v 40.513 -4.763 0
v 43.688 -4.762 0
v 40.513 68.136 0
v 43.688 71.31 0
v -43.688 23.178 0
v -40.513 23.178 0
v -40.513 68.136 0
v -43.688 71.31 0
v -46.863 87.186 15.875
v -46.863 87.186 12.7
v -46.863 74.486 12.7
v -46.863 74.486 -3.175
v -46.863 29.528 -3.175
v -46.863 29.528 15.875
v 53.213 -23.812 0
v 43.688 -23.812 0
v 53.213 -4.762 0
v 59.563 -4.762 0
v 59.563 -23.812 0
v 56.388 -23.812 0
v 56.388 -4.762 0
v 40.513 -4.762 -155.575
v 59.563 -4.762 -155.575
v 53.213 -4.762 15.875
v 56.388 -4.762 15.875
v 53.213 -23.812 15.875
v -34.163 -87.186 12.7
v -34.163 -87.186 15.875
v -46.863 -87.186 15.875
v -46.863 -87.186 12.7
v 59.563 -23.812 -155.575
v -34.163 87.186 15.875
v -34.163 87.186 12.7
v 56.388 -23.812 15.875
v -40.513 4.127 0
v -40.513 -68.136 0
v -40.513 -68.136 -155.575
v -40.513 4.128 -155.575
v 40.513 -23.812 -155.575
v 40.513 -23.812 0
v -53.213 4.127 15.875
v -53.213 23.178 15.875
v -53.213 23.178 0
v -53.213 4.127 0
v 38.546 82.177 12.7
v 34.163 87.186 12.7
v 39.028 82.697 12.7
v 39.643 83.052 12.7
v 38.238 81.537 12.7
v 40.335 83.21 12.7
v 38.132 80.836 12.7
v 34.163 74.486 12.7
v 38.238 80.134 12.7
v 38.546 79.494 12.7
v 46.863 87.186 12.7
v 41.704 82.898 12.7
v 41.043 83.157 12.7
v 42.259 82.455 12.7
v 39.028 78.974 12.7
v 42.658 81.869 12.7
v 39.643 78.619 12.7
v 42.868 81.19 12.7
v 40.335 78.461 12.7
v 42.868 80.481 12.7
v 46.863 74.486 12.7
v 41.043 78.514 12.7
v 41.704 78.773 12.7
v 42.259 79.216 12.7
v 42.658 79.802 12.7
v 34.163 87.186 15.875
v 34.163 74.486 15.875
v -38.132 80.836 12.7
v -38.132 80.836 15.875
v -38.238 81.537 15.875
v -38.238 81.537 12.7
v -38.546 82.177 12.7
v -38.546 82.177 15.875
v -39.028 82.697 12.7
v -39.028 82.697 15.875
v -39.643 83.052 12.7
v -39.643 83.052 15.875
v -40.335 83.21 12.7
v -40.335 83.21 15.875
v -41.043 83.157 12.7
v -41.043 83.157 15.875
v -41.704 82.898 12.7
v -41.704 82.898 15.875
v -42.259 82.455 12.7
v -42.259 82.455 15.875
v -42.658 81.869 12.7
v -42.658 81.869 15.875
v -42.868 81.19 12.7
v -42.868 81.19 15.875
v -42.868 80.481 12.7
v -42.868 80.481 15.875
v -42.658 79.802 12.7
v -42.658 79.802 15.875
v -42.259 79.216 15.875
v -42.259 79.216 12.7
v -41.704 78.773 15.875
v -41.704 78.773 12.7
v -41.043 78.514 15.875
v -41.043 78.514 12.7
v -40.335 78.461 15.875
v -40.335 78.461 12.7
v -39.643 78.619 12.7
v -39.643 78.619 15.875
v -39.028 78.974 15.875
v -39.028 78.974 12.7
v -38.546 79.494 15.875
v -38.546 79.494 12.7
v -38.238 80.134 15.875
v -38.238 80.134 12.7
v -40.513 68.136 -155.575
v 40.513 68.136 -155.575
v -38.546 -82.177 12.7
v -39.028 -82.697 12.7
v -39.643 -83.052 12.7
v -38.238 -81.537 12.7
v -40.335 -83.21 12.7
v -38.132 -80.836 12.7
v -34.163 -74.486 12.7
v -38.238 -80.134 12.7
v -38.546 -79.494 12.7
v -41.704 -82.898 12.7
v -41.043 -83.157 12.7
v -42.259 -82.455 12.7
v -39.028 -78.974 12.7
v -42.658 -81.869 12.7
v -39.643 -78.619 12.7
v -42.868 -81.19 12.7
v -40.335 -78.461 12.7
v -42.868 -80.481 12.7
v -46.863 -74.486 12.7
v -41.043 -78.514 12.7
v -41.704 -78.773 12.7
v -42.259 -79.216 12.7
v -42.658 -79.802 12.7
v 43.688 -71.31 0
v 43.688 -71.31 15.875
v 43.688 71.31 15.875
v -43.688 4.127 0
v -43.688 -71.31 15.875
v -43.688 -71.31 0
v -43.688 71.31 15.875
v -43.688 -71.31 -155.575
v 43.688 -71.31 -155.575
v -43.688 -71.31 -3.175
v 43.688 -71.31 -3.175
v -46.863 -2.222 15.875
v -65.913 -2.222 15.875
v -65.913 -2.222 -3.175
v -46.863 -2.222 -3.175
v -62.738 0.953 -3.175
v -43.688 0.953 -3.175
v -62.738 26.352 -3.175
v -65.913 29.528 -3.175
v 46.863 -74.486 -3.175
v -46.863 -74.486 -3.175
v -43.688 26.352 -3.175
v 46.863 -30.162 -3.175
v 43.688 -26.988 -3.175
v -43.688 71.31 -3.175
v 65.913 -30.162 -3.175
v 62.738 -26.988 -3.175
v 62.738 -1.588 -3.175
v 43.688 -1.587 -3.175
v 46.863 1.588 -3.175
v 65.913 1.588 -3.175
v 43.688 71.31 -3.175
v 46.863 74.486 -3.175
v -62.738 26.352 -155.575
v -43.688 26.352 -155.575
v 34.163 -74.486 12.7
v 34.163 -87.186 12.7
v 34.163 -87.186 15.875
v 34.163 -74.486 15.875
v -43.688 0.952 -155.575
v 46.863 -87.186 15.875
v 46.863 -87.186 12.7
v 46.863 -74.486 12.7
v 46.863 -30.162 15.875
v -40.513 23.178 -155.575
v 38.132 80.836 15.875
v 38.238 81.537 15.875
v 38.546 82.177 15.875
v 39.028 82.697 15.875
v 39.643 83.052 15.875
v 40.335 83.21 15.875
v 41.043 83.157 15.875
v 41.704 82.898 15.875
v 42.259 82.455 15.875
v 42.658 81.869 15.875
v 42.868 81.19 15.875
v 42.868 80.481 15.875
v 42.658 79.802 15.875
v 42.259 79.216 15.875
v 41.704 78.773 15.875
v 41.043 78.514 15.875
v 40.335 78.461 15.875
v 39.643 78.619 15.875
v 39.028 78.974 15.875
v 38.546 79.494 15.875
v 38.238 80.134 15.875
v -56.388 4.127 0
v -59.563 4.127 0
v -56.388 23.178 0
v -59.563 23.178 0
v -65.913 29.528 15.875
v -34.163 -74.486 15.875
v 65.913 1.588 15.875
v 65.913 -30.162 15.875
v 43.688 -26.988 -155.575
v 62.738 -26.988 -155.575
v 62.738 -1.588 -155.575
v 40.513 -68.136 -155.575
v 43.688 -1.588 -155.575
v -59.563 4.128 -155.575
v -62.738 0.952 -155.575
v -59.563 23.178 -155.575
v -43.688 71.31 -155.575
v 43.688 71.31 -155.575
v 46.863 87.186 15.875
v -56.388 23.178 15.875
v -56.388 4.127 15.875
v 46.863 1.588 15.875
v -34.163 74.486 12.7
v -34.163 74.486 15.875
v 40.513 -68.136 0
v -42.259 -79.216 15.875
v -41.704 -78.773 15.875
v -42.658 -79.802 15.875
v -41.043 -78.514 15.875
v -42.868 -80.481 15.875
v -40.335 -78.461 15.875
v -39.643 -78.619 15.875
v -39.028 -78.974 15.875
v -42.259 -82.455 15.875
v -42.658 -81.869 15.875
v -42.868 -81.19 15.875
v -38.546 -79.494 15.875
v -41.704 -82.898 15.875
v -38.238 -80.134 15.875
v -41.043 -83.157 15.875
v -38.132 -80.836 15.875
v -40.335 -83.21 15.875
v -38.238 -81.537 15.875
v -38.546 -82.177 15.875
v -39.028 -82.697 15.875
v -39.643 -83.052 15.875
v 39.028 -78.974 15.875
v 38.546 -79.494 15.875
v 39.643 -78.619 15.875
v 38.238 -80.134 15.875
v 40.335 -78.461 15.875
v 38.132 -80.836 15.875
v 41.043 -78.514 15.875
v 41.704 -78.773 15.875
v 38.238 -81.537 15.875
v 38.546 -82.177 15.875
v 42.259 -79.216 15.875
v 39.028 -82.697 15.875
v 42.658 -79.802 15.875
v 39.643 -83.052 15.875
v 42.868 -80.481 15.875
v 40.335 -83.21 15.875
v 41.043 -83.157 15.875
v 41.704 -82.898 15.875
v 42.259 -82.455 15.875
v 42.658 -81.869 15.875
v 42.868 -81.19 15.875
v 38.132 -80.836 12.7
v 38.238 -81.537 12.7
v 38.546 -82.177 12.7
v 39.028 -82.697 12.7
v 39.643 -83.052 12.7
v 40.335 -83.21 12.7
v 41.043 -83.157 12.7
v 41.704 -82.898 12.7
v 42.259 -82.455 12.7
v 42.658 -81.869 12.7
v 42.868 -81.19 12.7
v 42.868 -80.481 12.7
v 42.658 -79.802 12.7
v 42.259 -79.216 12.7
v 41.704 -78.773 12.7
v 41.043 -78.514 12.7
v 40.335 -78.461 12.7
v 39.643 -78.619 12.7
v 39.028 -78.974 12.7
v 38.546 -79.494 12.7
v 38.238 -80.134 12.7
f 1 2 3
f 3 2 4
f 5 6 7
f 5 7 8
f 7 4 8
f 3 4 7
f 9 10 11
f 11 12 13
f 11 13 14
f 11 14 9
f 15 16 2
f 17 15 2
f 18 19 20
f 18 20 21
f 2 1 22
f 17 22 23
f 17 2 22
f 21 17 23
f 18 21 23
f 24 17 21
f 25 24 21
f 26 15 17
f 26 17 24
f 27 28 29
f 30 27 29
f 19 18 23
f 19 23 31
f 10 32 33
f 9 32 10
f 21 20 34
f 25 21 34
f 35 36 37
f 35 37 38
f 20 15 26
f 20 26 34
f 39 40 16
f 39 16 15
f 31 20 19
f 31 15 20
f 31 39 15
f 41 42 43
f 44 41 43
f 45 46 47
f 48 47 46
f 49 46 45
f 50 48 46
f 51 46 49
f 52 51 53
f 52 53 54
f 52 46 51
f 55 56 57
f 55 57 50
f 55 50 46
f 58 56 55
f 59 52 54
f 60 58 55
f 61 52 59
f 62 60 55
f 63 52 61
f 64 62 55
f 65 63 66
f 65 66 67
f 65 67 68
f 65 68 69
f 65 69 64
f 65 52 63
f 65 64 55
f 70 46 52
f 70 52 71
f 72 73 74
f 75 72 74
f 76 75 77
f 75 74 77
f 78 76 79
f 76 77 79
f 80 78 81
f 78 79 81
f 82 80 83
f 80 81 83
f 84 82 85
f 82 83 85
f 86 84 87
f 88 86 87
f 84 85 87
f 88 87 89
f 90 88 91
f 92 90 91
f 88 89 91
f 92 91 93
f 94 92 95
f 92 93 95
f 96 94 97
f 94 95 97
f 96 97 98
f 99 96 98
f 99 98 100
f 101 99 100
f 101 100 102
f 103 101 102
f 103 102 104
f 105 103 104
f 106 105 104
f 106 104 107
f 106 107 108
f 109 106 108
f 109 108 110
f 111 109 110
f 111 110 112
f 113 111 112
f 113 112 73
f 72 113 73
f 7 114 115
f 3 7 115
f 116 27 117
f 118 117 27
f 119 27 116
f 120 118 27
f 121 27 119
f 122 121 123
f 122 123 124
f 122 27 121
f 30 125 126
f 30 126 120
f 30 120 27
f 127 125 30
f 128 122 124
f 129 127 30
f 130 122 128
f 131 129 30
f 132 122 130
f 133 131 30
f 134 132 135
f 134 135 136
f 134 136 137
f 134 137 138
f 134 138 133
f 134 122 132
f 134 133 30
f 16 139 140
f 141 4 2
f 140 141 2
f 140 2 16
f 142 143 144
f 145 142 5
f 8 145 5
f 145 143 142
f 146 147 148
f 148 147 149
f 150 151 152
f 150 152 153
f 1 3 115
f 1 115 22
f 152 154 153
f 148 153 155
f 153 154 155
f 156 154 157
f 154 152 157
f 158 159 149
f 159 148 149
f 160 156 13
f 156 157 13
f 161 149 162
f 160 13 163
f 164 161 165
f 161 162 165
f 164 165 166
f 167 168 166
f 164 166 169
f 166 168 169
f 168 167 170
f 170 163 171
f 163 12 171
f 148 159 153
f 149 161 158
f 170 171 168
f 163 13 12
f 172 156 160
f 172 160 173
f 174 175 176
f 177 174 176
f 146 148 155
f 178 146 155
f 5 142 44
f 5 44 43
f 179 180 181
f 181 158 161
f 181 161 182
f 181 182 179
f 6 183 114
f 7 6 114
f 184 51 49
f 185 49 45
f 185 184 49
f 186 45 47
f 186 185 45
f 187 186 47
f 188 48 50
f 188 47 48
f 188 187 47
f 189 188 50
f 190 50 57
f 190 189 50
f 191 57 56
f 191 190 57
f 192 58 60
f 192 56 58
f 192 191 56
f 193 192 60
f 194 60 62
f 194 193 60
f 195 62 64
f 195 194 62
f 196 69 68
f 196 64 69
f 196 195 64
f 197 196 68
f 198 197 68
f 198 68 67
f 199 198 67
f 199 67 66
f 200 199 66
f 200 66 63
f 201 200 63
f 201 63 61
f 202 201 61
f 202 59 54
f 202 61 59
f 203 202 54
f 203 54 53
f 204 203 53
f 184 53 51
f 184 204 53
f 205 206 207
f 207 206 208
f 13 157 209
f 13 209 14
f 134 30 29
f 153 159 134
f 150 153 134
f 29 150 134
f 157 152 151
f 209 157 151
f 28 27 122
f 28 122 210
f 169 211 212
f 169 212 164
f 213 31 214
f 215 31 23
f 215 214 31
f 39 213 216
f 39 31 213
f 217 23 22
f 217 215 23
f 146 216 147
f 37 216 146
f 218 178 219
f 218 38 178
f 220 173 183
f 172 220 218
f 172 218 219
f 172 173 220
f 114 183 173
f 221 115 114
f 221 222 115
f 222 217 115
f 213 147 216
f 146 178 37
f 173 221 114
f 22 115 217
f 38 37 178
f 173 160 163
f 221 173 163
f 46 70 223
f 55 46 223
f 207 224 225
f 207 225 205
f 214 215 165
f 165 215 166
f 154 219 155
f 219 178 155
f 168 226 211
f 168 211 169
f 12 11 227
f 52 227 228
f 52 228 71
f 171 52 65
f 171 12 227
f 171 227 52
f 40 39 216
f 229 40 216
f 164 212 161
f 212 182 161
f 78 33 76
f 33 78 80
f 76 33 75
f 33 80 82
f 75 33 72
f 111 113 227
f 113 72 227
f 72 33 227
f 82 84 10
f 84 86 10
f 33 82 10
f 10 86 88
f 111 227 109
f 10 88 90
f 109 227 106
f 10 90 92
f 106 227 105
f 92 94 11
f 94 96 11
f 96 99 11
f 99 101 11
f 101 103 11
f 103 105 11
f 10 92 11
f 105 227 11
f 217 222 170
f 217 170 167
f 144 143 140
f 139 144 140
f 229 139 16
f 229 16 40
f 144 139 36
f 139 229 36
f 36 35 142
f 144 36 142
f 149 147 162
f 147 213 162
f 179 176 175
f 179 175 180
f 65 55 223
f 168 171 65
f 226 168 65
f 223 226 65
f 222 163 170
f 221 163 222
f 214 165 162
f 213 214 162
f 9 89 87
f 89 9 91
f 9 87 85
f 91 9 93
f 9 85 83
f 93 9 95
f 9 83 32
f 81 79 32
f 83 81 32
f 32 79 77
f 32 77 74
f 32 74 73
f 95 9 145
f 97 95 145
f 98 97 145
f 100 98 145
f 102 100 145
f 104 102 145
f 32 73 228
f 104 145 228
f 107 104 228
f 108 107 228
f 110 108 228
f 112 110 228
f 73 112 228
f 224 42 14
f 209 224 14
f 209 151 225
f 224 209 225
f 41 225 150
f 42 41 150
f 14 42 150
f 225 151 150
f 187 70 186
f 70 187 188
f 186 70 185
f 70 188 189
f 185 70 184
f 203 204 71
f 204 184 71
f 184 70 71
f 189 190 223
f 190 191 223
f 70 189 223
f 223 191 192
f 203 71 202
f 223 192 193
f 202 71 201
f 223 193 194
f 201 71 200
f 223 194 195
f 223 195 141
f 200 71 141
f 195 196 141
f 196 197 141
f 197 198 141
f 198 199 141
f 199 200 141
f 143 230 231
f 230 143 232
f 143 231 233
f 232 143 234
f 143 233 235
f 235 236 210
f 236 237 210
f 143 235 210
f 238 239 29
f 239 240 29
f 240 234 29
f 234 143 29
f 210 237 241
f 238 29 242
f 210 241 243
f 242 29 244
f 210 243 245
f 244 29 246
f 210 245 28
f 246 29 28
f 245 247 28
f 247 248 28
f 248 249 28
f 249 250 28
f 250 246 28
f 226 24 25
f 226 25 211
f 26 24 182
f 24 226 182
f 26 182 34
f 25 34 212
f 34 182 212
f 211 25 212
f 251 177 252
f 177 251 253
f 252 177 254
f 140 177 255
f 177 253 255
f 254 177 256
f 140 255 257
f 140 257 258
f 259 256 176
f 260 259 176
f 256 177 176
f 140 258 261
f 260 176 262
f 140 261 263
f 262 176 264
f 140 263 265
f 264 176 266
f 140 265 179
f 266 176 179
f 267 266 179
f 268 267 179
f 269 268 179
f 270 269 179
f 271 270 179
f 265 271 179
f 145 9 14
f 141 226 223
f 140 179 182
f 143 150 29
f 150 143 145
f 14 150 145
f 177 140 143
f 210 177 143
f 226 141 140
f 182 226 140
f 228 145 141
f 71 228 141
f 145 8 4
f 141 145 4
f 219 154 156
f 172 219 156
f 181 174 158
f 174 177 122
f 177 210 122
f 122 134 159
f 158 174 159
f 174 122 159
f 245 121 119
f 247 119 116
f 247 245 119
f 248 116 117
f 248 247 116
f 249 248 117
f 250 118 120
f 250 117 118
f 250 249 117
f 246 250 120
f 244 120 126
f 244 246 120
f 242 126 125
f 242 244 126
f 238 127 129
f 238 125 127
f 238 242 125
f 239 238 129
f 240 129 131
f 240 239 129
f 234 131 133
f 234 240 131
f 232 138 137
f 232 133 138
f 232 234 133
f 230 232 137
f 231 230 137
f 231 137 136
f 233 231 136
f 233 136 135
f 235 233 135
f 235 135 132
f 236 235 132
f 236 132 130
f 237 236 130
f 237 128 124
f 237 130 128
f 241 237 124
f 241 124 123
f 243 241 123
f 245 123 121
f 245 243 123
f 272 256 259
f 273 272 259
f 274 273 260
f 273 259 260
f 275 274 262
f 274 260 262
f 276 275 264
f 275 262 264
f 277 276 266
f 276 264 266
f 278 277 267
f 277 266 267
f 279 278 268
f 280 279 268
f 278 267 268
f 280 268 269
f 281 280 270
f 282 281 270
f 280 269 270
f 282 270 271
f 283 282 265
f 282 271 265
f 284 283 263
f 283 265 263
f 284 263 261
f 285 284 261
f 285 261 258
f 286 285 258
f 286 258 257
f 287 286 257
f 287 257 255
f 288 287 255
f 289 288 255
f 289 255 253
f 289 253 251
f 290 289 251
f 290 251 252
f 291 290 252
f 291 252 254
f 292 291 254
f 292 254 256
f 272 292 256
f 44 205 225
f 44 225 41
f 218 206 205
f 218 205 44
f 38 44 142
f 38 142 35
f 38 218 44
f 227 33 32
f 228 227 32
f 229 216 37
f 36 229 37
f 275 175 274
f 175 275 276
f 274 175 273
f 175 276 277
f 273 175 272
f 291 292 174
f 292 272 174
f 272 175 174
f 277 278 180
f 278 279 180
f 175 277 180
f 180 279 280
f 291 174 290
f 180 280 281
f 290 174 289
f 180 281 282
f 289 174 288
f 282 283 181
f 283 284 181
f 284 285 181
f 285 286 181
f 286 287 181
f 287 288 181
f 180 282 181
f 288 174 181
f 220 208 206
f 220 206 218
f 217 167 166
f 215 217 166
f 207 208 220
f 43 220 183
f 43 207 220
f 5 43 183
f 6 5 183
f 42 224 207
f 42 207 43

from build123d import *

# Parameters (mm, degrees)
BOSS_EXTRUDE1_DEPTH     = 155.575
SHELL1_T                = -3.175
SKETCH2_W               = 19.05
SKETCH2_H               = 72.263
SKETCH2_H_2             = 44.958
BOSS_EXTRUDE2_DEPTH     = 3.175
SKETCH5_W               = 90.551
SKETCH5_H               = 19.05
BOSS_EXTRUDE8_DEPTH     = 3.175
SKETCH7_W               = 19.05
SKETCH7_H               = 47.498
ALL_6_DEPTH             = 3.175
SKETCH8_W               = 19.05
SKETCH8_H               = 72.898
ALL_5_DEPTH             = 3.175
SKETCH9_W               = 93.726
SKETCH9_H               = 19.05
BOSS_EXTRUDE12_DEPTH    = 3.175
SKETCH10_W              = 15.875
SKETCH10_H              = 19.05
ALL2_DEPTH              = 3.175
SKETCH11_W              = 15.875
SKETCH11_H              = 19.05
ALL_7_DEPTH             = 3.175
SKETCH13_W              = 19.05
SKETCH13_H              = 25.4
ALL_2_DEPTH             = 3.175
SKETCH27_W              = 12.7
SKETCH27_H              = 3.175
BOSS_EXTRUDE29_DEPTH    = 12.7
SKETCH28_R              = 2.38125
CUT_EXTRUDE4_DEPTH      = 227.835119161
MIRROR2_COPY_1_SKETCH_W = 12.7
MIRROR2_COPY_1_SKETCH_H = 3.175
MIRROR2_COPY_1_DEPTH    = 12.7
MIRROR2_COPY_2_SKETCH_R = 2.38125
MIRROR2_COPY_2_DEPTH    = 227.835119161
SKETCH31_W              = 15.875
SKETCH31_H              = 22.225
BOSS_EXTRUDE31_DEPTH    = 3.175
SKETCH87_W              = 19.05
SKETCH87_H              = 31.75
ALL3_DEPTH              = 3.175
SKETCH91_W              = 15.875
SKETCH91_H              = 25.4
ALL_4_DEPTH             = 3.175
CUT_EXTRUDE24_DEPTH     = 201.654704914
SKETCH102_W             = 19.05
SKETCH102_H             = 19.05
BOSS_EXTRUDE58_DEPTH    = 3.175
SKETCH103_W             = 19.05
SKETCH103_H             = 19.05
BOSS_EXTRUDE59_DEPTH    = 3.175
SKETCH105_W             = 15.875
SKETCH105_H             = 25.4
BOSS_EXTRUDE65_DEPTH    = 9.525
SKETCH106_W             = 15.875
SKETCH106_H             = 25.4
BOSS_EXTRUDE66_DEPTH    = 9.525
SKETCH107_W             = 15.875
SKETCH107_H             = 25.4
BOSS_EXTRUDE67_DEPTH    = 6.35
SKETCH108_W             = 15.875
SKETCH108_H             = 25.4
BOSS_EXTRUDE68_DEPTH    = 6.35
SKETCH109_W             = 3.175
SKETCH109_H             = 15.875
BOSS_EXTRUDE69_DEPTH    = 3.175
SKETCH110_W             = 3.175
SKETCH110_H             = 15.875
BOSS_EXTRUDE70_DEPTH    = 3.175
SKETCH111_W             = 3.175
SKETCH111_H             = 15.875
BOSS_EXTRUDE71_DEPTH    = 3.175
SKETCH112_W             = 3.175
SKETCH112_H             = 15.875
BOSS_EXTRUDE72_DEPTH    = 3.175


with BuildPart() as part:
    # Sketch1 → Boss-Extrude1 (new body)
    with BuildSketch(Plane.XY):
        Polygon((-43.688, 71.3105), (43.688, 71.3105), (43.688, -1.5875), (62.738, -1.5875), (62.738, -26.9875), (43.688, -26.9875), (43.688, -71.3105), (-43.688, -71.3105), (-43.688, 0.9525), (-62.738, 0.9525), (-62.738, 26.3525), (-43.688, 26.3525), align=None)
    extrude(amount=-BOSS_EXTRUDE1_DEPTH)

    # Shell1
    shell1_openings = [part.faces().sort_by_distance(p)[0] for p in [
        (0, -0.022879475, 0),
    ]]
    offset(amount=SHELL1_T, openings=shell1_openings, kind=Kind.INTERSECTION)

    # Sketch2 → Boss-Extrude2 (add)
    with BuildSketch(Plane.ZY.offset(43.688)):
        with Locations((6.35, -35.179)):
            Rectangle(SKETCH2_W, SKETCH2_H)
        with Locations((6.35, 48.8315)):
            Rectangle(SKETCH2_W, SKETCH2_H_2)
    extrude(amount=BOSS_EXTRUDE2_DEPTH)

    # Sketch5 → Boss-Extrude8 (add)
    with BuildSketch(Plane.XZ.offset(71.3105)):
        with Locations((-1.5875, 6.35)):
            Rectangle(SKETCH5_W, SKETCH5_H)
    extrude(amount=BOSS_EXTRUDE8_DEPTH)

    # Sketch7 → ALL 6 (add)
    with BuildSketch(Plane(origin=(43.688, 0, 0), x_dir=(0, 0, -1), z_dir=(1, 0, 0))):
        with Locations((-6.35, -50.7365)):
            Rectangle(SKETCH7_W, SKETCH7_H)
    extrude(amount=ALL_6_DEPTH)

    # Sketch8 → ALL 5 (add)
    with BuildSketch(Plane(origin=(43.688, 0, 0), x_dir=(0, 0, -1), z_dir=(1, 0, 0))):
        with Locations((-6.35, 34.8615)):
            Rectangle(SKETCH8_W, SKETCH8_H)
    extrude(amount=ALL_5_DEPTH)

    # Sketch9 → Boss-Extrude12 (add)
    with BuildSketch(Plane(origin=(0, 71.3105, 0), x_dir=(1, 0, 0), z_dir=(0, 1, 0))):
        with Locations((0, -6.35)):
            Rectangle(SKETCH9_W, SKETCH9_H)
    extrude(amount=BOSS_EXTRUDE12_DEPTH)

    # Sketch10 → ALL2 (add)
    with BuildSketch(Plane(origin=(0, -1.5875, 0), x_dir=(1, 0, 0), z_dir=(0, 1, 0))):
        with Locations((54.8005, -6.35)):
            Rectangle(SKETCH10_W, SKETCH10_H)
    extrude(amount=ALL2_DEPTH)

    # Sketch11 → ALL 7 (add)
    with BuildSketch(Plane.XZ.offset(26.9875)):
        with Locations((54.8005, 6.35)):
            Rectangle(SKETCH11_W, SKETCH11_H)
    extrude(amount=ALL_7_DEPTH)

    # Sketch13 → ALL 2 (add)
    with BuildSketch(Plane.ZY.offset(62.738)):
        with Locations((6.35, 13.6525)):
            Rectangle(SKETCH13_W, SKETCH13_H)
    extrude(amount=ALL_2_DEPTH)

    # Sketch27 → Boss-Extrude29 (add)
    with BuildSketch(Plane(origin=(0, 74.4855, -58.6105), x_dir=(1, 0, 0), z_dir=(0, -1, 0))):
        with Locations((40.513, 72.898)):
            Rectangle(SKETCH27_W, SKETCH27_H)
    boss_extrude29 = extrude(amount=-BOSS_EXTRUDE29_DEPTH)

    # Sketch28 → Cut-Extrude4 (cut, through all)
    with BuildSketch(Plane(origin=(0, 58.6105, 15.875), x_dir=(1, 0, 0), z_dir=(0, 0, -1))):
        with Locations(Location((40.513, -22.225, 0), (0, 0, 180))):
            Circle(SKETCH28_R)
    cut_extrude4 = extrude(amount=CUT_EXTRUDE4_DEPTH, mode=Mode.SUBTRACT)

    # Mirror1: Boss-Extrude29, Cut-Extrude4 across plane
    add(boss_extrude29.mirror(Plane(origin=(0, 0, 0), x_dir=(0, 0, 1), z_dir=(1, 0, 0))))
    add(cut_extrude4.mirror(Plane(origin=(0, 0, 0), x_dir=(0, 0, 1), z_dir=(1, 0, 0))), mode=Mode.SUBTRACT)

    # Mirror2: Boss-Extrude29, Cut-Extrude4 across plane
    add(boss_extrude29.mirror(Plane.ZX))
    add(cut_extrude4.mirror(Plane.ZX), mode=Mode.SUBTRACT)

    # Mirror2 copy 1 sketch → Mirror2 copy 1 (add)
    with BuildSketch(Plane(origin=(0, -74.4855, -58.6105), x_dir=(-1, 0, 0), z_dir=(0, 1, 0))):
        with Locations((40.513, 72.898)):
            Rectangle(MIRROR2_COPY_1_SKETCH_W, MIRROR2_COPY_1_SKETCH_H)
    extrude(amount=-MIRROR2_COPY_1_DEPTH)

    # Mirror2 copy 2 sketch → Mirror2 copy 2 (cut, through all)
    with BuildSketch(Plane(origin=(0, -58.6105, 15.875), x_dir=(-1, 0, 0), z_dir=(0, 0, -1))):
        with Locations(Location((40.513, -22.225, 0), (0, 0, 180))):
            Circle(MIRROR2_COPY_2_SKETCH_R)
    extrude(amount=MIRROR2_COPY_2_DEPTH, mode=Mode.SUBTRACT)

    # Sketch31 → Boss-Extrude31 (add)
    with BuildSketch(Plane(origin=(-62.738, 0, 0), x_dir=(0, 0, -1), z_dir=(1, 0, 0))):
        with Locations((-7.9375, 15.24)):
            Rectangle(SKETCH31_W, SKETCH31_H)
    extrude(amount=BOSS_EXTRUDE31_DEPTH)

    # Sketch87 → ALL3 (add)
    with BuildSketch(Plane(origin=(62.738, 0, 0), x_dir=(0, 0, -1), z_dir=(1, 0, 0))):
        with Locations((-6.35, -14.2875)):
            Rectangle(SKETCH87_W, SKETCH87_H)
    extrude(amount=ALL3_DEPTH)

    # Sketch91 → ALL 4 (cut)
    with BuildSketch(Plane(origin=(-59.563, 0, 0), x_dir=(0, 0, -1), z_dir=(1, 0, 0))):
        with Locations((-7.9375, 13.6525)):
            Rectangle(SKETCH91_W, SKETCH91_H)
    extrude(amount=-ALL_4_DEPTH, mode=Mode.SUBTRACT)

    # Sketch101 → Cut-Extrude24 (cut, through all)
    with BuildSketch(Plane.XY.offset(-152.4)):
        Polygon((-40.513, -68.1355), (40.513, -68.1355), (40.513, -23.8125), (59.563, -23.8125), (59.563, -4.7625), (40.513, -4.7625), (40.513, 68.1355), (-40.513, 68.1355), (-40.513, 23.1775), (-59.563, 23.1775), (-59.563, 4.1275), (-40.513, 4.1275), align=None)
    extrude(amount=-CUT_EXTRUDE24_DEPTH, mode=Mode.SUBTRACT)

    # Sketch102 → Boss-Extrude58 (add)
    with BuildSketch(Plane(origin=(0, 26.3525, 0), x_dir=(1, 0, 0), z_dir=(0, 1, 0))):
        with Locations((-56.388, -6.35)):
            Rectangle(SKETCH102_W, SKETCH102_H)
    extrude(amount=BOSS_EXTRUDE58_DEPTH)

    # Sketch103 → Boss-Extrude59 (add)
    with BuildSketch(Plane.XZ.offset(-0.9525)):
        with Locations((-56.388, 6.35)):
            Rectangle(SKETCH103_W, SKETCH103_H)
    extrude(amount=BOSS_EXTRUDE59_DEPTH)

    # Sketch105 → Boss-Extrude65 (add)
    with BuildSketch(Plane(origin=(-43.688, 0, 0), x_dir=(0, 0, -1), z_dir=(1, 0, 0))):
        with Locations((-7.9375, 13.6525)):
            Rectangle(SKETCH105_W, SKETCH105_H)
    extrude(amount=-BOSS_EXTRUDE65_DEPTH)

    # Sketch106 → Boss-Extrude66 (add)
    with BuildSketch(Plane.ZY.offset(-43.688)):
        with Locations((7.9375, -14.2875)):
            Rectangle(SKETCH106_W, SKETCH106_H)
    extrude(amount=-BOSS_EXTRUDE66_DEPTH)

    # Sketch107 → Boss-Extrude67 (add)
    with BuildSketch(Plane.ZY.offset(-62.738)):
        with Locations((7.9375, -14.2875)):
            Rectangle(SKETCH107_W, SKETCH107_H)
    extrude(amount=BOSS_EXTRUDE67_DEPTH)

    # Sketch108 → Boss-Extrude68 (add)
    with BuildSketch(Plane(origin=(-62.738, 0, 0), x_dir=(0, 0, -1), z_dir=(1, 0, 0))):
        with Locations((-7.9375, 13.6525)):
            Rectangle(SKETCH108_W, SKETCH108_H)
    extrude(amount=BOSS_EXTRUDE68_DEPTH)

    # Sketch109 → Boss-Extrude69 (add)
    with BuildSketch(Plane(origin=(0, 0.9525, 0), x_dir=(1, 0, 0), z_dir=(0, 1, 0))):
        with Locations((-54.8005, -7.9375)):
            Rectangle(SKETCH109_W, SKETCH109_H)
    extrude(amount=BOSS_EXTRUDE69_DEPTH)

    # Sketch110 → Boss-Extrude70 (add)
    with BuildSketch(Plane.XZ.offset(-26.3525)):
        with Locations((-54.8005, 7.9375)):
            Rectangle(SKETCH110_W, SKETCH110_H)
    extrude(amount=BOSS_EXTRUDE70_DEPTH)

    # Sketch111 → Boss-Extrude71 (add)
    with BuildSketch(Plane.XZ.offset(1.5875)):
        with Locations((54.8005, 7.9375)):
            Rectangle(SKETCH111_W, SKETCH111_H)
    extrude(amount=BOSS_EXTRUDE71_DEPTH)

    # Sketch112 → Boss-Extrude72 (add)
    with BuildSketch(Plane(origin=(0, -26.9875, 0), x_dir=(1, 0, 0), z_dir=(0, 1, 0))):
        with Locations((54.8005, -7.9375)):
            Rectangle(SKETCH112_W, SKETCH112_H)
    extrude(amount=BOSS_EXTRUDE72_DEPTH)


solid = part.part
